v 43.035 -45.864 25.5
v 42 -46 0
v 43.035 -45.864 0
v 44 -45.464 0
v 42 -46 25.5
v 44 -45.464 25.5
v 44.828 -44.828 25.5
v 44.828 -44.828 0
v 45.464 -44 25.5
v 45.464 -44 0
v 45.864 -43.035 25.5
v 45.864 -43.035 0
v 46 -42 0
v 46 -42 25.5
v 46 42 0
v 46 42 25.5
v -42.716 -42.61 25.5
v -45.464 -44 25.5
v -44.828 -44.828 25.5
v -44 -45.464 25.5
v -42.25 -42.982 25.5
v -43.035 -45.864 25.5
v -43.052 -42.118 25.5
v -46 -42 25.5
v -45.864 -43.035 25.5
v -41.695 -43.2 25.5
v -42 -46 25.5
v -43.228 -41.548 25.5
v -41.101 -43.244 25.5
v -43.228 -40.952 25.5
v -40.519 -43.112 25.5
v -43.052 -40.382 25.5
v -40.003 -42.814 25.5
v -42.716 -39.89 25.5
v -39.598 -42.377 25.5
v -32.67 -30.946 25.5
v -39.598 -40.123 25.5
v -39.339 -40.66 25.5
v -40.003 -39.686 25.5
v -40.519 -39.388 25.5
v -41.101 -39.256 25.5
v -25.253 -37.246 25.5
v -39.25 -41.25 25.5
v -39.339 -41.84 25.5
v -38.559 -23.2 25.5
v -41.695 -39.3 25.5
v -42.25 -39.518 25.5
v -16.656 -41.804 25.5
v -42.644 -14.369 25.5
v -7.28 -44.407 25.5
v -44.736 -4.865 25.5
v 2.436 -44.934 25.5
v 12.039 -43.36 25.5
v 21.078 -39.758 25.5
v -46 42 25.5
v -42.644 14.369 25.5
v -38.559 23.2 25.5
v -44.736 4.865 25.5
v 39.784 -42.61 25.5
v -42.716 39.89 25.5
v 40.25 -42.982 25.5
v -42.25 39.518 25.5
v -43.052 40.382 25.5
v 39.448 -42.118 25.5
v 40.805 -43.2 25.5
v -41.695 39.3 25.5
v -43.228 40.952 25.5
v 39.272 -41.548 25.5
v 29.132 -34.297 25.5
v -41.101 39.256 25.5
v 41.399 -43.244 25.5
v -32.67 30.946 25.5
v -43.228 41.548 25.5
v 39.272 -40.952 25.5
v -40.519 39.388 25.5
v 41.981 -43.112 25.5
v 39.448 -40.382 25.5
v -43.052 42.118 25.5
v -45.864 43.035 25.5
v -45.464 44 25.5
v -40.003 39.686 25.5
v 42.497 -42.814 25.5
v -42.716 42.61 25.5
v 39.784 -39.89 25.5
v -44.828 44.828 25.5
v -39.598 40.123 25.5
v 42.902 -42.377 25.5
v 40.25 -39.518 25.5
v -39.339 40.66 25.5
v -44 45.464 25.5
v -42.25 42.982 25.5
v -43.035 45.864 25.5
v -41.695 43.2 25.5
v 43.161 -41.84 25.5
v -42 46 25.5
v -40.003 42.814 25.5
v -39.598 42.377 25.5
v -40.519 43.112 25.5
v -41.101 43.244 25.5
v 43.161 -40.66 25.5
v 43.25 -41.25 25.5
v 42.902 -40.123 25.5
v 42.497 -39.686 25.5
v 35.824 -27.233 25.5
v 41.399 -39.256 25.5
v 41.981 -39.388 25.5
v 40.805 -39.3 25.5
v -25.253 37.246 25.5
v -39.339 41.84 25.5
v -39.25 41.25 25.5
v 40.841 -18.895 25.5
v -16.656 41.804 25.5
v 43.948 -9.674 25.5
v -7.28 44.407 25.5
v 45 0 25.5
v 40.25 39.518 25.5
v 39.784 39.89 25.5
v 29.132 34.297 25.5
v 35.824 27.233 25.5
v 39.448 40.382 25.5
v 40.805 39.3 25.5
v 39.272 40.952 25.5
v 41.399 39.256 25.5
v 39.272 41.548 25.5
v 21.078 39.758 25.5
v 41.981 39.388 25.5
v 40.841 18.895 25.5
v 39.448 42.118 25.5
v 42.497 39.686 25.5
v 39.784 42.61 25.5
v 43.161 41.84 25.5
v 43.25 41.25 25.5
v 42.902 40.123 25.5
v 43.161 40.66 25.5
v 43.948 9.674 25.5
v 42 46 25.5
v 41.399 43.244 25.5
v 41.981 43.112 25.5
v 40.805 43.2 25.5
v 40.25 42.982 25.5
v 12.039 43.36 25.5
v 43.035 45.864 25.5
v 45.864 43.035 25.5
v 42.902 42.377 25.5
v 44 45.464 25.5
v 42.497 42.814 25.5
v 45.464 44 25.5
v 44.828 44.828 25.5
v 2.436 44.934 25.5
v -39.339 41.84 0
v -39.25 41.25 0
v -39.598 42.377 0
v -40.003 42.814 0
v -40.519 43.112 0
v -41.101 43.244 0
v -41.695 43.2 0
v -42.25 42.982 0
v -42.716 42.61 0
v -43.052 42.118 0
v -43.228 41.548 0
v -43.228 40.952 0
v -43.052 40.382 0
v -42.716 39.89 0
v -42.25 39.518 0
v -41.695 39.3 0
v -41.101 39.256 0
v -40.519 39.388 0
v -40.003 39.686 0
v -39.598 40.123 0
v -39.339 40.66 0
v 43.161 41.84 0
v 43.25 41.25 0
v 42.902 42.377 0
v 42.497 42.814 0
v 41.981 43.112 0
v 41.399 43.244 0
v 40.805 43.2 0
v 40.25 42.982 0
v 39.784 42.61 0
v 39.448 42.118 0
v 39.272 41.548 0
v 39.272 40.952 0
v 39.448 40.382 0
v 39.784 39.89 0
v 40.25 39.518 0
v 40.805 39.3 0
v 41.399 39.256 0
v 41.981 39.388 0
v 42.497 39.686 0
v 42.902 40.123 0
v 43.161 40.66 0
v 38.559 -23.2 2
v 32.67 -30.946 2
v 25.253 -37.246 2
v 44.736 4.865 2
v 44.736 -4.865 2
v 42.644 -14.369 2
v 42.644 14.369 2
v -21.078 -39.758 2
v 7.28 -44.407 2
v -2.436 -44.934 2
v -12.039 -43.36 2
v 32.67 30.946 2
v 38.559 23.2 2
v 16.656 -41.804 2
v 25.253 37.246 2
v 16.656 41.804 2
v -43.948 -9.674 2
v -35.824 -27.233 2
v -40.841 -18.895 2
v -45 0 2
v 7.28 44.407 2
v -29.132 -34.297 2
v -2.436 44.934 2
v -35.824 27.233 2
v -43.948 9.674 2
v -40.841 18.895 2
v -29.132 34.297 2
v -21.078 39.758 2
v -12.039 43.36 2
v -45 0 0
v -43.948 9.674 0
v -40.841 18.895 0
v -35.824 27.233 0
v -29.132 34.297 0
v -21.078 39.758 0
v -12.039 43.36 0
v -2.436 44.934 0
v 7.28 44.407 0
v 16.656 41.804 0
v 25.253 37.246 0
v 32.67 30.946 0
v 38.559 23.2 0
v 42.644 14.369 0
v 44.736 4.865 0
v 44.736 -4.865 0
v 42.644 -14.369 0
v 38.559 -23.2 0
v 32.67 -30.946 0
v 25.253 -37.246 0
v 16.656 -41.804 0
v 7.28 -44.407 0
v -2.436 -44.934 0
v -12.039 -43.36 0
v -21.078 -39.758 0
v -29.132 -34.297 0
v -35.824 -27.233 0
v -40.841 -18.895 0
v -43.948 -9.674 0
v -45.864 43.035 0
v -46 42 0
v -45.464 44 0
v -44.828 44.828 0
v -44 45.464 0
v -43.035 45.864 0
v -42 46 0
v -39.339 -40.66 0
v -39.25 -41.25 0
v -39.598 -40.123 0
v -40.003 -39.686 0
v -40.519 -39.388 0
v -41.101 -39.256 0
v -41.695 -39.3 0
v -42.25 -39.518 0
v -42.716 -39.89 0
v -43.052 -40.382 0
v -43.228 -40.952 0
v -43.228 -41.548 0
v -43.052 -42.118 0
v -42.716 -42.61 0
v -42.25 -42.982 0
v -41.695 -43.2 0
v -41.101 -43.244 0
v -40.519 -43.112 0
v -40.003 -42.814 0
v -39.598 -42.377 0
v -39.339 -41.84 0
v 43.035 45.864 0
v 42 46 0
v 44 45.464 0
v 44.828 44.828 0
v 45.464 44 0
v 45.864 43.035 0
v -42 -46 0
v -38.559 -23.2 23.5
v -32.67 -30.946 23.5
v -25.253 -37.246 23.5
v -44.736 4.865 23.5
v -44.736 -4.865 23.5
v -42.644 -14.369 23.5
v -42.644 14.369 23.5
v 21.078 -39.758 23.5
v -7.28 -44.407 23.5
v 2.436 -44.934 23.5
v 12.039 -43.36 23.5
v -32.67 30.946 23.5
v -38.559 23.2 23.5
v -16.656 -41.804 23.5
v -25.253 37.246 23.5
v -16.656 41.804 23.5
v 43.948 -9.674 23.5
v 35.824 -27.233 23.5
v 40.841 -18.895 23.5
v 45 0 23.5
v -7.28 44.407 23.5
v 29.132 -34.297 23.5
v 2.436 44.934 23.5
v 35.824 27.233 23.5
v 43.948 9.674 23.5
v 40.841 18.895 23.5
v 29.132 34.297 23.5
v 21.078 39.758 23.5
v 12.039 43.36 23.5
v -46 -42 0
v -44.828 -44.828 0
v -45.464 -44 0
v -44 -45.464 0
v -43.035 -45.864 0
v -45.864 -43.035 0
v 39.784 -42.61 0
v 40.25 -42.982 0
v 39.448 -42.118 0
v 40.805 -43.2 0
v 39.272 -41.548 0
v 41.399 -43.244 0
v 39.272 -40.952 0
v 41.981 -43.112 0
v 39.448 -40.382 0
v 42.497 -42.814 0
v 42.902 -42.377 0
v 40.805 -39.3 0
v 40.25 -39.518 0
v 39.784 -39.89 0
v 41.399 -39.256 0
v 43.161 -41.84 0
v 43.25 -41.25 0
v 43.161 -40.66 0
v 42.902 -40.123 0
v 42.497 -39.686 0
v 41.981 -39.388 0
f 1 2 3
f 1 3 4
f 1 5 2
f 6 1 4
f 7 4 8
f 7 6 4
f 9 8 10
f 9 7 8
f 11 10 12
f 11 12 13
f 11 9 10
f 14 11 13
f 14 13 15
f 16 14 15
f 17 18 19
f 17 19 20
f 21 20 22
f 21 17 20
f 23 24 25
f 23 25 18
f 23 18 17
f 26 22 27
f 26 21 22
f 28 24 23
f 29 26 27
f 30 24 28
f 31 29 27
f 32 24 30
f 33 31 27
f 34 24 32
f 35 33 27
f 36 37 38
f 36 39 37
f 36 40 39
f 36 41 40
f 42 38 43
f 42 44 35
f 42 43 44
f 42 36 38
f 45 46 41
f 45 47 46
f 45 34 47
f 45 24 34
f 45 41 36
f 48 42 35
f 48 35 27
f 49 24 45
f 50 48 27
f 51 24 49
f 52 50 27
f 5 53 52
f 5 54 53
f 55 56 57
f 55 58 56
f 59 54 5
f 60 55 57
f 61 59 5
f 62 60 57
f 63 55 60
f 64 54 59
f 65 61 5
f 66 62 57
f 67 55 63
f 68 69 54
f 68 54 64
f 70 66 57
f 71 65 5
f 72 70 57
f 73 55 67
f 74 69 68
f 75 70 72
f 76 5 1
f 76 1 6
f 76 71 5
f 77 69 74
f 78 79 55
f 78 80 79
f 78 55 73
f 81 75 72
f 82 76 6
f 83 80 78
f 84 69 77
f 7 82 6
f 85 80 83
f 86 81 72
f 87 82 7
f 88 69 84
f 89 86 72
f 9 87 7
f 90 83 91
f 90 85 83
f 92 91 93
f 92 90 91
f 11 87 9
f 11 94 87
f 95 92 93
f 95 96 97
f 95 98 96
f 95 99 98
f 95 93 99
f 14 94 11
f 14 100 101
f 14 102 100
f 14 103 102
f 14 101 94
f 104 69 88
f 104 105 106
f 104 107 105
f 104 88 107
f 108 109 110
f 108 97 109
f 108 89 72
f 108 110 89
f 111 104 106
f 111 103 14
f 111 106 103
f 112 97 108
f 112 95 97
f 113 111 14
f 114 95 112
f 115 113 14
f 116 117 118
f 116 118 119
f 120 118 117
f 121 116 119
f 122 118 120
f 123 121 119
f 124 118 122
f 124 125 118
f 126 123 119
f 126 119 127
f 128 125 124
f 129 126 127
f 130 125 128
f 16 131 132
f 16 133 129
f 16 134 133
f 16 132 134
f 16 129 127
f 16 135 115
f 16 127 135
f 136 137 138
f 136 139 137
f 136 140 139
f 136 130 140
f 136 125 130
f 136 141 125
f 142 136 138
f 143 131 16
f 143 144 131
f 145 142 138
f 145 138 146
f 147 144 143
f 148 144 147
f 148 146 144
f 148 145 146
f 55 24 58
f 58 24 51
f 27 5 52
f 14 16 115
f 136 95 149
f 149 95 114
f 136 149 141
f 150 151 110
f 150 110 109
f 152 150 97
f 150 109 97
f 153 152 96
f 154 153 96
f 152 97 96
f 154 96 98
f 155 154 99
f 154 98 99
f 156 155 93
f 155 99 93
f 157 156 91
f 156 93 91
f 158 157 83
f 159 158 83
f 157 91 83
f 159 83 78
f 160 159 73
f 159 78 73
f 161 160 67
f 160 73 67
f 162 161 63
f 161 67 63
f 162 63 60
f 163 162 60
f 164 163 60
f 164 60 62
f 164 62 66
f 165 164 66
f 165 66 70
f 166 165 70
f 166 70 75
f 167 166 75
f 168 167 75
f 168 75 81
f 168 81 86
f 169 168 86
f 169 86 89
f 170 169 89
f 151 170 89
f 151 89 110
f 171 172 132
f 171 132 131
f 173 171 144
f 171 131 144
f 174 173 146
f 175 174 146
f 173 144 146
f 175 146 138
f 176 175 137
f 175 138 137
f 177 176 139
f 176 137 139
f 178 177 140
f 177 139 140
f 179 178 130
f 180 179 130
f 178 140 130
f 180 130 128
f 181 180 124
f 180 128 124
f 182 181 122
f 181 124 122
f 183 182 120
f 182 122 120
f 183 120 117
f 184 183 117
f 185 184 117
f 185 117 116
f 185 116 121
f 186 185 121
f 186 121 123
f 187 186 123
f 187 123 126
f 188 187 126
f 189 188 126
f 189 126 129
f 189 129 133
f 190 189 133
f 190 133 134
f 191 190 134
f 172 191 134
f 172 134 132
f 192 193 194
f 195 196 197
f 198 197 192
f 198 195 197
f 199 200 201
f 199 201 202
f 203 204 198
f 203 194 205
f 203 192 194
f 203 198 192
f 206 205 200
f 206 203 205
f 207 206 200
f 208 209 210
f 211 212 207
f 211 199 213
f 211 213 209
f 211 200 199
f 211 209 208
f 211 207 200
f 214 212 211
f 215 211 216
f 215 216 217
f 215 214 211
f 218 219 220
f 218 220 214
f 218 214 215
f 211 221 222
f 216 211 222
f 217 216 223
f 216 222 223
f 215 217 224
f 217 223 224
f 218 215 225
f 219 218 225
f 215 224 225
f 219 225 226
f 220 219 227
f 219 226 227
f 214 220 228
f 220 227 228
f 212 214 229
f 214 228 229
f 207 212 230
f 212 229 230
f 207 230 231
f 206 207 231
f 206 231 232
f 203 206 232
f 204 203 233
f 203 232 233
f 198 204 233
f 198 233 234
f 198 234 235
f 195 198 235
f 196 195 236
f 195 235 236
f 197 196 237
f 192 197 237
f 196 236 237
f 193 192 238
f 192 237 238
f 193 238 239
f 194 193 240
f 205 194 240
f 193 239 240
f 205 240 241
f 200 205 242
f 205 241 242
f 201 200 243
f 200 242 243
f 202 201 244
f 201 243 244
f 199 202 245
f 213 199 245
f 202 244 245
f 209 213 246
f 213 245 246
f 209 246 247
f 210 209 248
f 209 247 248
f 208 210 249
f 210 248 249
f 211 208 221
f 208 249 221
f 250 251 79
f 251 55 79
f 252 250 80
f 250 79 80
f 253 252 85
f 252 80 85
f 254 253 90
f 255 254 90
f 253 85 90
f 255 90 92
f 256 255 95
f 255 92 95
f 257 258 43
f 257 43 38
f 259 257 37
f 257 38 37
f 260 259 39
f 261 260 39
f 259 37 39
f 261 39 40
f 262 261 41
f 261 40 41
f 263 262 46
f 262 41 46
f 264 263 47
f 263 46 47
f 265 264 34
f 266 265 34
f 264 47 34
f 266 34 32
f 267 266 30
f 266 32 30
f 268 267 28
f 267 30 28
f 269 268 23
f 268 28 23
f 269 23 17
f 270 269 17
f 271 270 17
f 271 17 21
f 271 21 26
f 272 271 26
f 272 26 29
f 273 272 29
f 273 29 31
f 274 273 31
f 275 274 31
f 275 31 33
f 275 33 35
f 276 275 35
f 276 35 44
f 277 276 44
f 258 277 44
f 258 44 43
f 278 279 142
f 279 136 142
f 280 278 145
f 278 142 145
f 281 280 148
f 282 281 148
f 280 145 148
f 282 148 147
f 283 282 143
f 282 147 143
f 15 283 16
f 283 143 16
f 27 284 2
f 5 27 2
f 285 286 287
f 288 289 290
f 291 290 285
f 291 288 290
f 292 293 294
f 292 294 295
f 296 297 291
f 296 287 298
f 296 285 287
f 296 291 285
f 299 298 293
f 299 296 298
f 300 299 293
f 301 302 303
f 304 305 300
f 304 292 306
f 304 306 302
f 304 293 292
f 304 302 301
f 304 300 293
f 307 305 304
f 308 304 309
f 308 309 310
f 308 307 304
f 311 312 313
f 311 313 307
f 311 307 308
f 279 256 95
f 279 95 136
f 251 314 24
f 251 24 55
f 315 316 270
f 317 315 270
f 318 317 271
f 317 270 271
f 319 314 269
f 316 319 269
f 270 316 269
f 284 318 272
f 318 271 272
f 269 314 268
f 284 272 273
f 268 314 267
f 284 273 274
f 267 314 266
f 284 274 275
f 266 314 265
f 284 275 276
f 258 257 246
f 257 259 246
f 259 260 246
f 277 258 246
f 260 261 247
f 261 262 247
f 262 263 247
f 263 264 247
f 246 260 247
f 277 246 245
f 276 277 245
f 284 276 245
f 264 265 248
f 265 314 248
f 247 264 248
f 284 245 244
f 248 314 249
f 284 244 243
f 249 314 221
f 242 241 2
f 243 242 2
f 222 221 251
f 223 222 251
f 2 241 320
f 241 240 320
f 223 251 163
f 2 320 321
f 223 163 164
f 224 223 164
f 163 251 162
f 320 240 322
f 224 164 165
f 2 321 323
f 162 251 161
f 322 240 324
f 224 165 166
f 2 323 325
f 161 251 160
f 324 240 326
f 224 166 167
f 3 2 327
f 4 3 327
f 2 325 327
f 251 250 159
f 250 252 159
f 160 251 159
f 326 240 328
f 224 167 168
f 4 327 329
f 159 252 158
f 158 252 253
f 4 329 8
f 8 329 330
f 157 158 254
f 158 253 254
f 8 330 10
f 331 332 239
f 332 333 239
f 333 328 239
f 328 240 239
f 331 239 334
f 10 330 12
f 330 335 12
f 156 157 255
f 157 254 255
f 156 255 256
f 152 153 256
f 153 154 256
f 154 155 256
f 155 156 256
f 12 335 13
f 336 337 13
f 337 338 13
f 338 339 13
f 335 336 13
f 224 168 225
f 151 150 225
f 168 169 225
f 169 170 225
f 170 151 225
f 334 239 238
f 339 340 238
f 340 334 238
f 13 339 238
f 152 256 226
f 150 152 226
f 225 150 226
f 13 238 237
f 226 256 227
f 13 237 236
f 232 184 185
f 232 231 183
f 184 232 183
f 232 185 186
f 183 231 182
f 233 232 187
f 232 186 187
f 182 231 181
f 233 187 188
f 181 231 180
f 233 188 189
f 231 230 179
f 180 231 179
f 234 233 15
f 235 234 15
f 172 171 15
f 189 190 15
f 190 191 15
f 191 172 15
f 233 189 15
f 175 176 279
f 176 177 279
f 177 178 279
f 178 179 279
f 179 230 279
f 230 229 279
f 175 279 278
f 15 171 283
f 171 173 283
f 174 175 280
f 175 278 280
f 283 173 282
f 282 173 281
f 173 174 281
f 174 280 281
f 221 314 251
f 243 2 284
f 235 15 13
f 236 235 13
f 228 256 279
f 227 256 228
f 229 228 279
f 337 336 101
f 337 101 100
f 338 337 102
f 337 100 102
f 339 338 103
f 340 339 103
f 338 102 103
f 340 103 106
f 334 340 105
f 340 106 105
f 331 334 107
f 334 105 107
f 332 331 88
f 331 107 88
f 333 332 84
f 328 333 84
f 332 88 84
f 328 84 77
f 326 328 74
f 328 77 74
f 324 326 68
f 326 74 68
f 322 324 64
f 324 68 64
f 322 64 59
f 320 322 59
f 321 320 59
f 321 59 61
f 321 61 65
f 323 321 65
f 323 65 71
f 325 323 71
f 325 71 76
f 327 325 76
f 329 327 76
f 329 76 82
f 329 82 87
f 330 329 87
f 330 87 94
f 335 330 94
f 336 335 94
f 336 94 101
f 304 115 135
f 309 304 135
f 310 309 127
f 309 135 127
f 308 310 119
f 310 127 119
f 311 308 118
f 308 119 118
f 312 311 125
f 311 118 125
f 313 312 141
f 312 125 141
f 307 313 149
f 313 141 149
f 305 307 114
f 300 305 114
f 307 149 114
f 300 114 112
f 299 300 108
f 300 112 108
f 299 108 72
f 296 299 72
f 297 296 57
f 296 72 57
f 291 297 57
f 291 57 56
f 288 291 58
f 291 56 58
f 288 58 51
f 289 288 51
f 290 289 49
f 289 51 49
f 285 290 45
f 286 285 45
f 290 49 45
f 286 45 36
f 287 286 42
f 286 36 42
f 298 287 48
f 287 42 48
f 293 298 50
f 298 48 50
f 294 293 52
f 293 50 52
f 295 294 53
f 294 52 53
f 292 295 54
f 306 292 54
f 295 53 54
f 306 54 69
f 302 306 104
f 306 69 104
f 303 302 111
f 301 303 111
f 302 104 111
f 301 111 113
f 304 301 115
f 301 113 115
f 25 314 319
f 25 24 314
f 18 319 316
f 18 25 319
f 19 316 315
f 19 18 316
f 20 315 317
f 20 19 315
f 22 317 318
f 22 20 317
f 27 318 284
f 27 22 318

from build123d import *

# Parameters (mm, degrees)
SKETCH1_W           = 92
SKETCH1_H           = 92
BOSS_EXTRUDE1_DEPTH = 25.5
SKETCH2_R           = 2
CUT_EXTRUDE1_DEPTH  = 26.5
FILLET1_R           = 4
SKETCH3_R           = 45
CUT_EXTRUDE2_DEPTH  = 2
SKETCH4_R           = 45
CUT_EXTRUDE3_DEPTH  = 2


with BuildPart() as part:
    # Sketch1 → Boss-Extrude1 (new body)
    with BuildSketch(Plane.XY):
        Rectangle(SKETCH1_W, SKETCH1_H)
    extrude(amount=BOSS_EXTRUDE1_DEPTH)

    # Sketch2 → Cut-Extrude1 (cut, through all)
    with BuildSketch(Plane.XY.offset(25.5)):
        with Locations((-41.25, 41.25)):
            Circle(SKETCH2_R)
        with Locations((41.25, 41.25)):
            Circle(SKETCH2_R)
        with Locations((41.25, -41.25)):
            Circle(SKETCH2_R)
        with Locations((-41.25, -41.25)):
            Circle(SKETCH2_R)
    extrude(amount=-CUT_EXTRUDE1_DEPTH, mode=Mode.SUBTRACT)

    # Fillet1
    fillet1_edges = [part.edges().sort_by_distance(p)[0] for p in [
        (46, -46, 12.75),
        (-46, -46, 12.75),
        (-46, 46, 12.75),
        (46, 46, 12.75),
    ]]
    fillet(fillet1_edges, radius=FILLET1_R)

    # Sketch3 → Cut-Extrude2 (cut)
    with BuildSketch(Plane.XY.offset(25.5)):
        Circle(SKETCH3_R)
    extrude(amount=-CUT_EXTRUDE2_DEPTH, mode=Mode.SUBTRACT)

    # Sketch4 → Cut-Extrude3 (cut)
    with BuildSketch(Plane(origin=(0, 0, 0), x_dir=(-1, 0, 0), z_dir=(0, 0, -1))):
        Circle(SKETCH4_R)
    extrude(amount=-CUT_EXTRUDE3_DEPTH, mode=Mode.SUBTRACT)


solid = part.part
